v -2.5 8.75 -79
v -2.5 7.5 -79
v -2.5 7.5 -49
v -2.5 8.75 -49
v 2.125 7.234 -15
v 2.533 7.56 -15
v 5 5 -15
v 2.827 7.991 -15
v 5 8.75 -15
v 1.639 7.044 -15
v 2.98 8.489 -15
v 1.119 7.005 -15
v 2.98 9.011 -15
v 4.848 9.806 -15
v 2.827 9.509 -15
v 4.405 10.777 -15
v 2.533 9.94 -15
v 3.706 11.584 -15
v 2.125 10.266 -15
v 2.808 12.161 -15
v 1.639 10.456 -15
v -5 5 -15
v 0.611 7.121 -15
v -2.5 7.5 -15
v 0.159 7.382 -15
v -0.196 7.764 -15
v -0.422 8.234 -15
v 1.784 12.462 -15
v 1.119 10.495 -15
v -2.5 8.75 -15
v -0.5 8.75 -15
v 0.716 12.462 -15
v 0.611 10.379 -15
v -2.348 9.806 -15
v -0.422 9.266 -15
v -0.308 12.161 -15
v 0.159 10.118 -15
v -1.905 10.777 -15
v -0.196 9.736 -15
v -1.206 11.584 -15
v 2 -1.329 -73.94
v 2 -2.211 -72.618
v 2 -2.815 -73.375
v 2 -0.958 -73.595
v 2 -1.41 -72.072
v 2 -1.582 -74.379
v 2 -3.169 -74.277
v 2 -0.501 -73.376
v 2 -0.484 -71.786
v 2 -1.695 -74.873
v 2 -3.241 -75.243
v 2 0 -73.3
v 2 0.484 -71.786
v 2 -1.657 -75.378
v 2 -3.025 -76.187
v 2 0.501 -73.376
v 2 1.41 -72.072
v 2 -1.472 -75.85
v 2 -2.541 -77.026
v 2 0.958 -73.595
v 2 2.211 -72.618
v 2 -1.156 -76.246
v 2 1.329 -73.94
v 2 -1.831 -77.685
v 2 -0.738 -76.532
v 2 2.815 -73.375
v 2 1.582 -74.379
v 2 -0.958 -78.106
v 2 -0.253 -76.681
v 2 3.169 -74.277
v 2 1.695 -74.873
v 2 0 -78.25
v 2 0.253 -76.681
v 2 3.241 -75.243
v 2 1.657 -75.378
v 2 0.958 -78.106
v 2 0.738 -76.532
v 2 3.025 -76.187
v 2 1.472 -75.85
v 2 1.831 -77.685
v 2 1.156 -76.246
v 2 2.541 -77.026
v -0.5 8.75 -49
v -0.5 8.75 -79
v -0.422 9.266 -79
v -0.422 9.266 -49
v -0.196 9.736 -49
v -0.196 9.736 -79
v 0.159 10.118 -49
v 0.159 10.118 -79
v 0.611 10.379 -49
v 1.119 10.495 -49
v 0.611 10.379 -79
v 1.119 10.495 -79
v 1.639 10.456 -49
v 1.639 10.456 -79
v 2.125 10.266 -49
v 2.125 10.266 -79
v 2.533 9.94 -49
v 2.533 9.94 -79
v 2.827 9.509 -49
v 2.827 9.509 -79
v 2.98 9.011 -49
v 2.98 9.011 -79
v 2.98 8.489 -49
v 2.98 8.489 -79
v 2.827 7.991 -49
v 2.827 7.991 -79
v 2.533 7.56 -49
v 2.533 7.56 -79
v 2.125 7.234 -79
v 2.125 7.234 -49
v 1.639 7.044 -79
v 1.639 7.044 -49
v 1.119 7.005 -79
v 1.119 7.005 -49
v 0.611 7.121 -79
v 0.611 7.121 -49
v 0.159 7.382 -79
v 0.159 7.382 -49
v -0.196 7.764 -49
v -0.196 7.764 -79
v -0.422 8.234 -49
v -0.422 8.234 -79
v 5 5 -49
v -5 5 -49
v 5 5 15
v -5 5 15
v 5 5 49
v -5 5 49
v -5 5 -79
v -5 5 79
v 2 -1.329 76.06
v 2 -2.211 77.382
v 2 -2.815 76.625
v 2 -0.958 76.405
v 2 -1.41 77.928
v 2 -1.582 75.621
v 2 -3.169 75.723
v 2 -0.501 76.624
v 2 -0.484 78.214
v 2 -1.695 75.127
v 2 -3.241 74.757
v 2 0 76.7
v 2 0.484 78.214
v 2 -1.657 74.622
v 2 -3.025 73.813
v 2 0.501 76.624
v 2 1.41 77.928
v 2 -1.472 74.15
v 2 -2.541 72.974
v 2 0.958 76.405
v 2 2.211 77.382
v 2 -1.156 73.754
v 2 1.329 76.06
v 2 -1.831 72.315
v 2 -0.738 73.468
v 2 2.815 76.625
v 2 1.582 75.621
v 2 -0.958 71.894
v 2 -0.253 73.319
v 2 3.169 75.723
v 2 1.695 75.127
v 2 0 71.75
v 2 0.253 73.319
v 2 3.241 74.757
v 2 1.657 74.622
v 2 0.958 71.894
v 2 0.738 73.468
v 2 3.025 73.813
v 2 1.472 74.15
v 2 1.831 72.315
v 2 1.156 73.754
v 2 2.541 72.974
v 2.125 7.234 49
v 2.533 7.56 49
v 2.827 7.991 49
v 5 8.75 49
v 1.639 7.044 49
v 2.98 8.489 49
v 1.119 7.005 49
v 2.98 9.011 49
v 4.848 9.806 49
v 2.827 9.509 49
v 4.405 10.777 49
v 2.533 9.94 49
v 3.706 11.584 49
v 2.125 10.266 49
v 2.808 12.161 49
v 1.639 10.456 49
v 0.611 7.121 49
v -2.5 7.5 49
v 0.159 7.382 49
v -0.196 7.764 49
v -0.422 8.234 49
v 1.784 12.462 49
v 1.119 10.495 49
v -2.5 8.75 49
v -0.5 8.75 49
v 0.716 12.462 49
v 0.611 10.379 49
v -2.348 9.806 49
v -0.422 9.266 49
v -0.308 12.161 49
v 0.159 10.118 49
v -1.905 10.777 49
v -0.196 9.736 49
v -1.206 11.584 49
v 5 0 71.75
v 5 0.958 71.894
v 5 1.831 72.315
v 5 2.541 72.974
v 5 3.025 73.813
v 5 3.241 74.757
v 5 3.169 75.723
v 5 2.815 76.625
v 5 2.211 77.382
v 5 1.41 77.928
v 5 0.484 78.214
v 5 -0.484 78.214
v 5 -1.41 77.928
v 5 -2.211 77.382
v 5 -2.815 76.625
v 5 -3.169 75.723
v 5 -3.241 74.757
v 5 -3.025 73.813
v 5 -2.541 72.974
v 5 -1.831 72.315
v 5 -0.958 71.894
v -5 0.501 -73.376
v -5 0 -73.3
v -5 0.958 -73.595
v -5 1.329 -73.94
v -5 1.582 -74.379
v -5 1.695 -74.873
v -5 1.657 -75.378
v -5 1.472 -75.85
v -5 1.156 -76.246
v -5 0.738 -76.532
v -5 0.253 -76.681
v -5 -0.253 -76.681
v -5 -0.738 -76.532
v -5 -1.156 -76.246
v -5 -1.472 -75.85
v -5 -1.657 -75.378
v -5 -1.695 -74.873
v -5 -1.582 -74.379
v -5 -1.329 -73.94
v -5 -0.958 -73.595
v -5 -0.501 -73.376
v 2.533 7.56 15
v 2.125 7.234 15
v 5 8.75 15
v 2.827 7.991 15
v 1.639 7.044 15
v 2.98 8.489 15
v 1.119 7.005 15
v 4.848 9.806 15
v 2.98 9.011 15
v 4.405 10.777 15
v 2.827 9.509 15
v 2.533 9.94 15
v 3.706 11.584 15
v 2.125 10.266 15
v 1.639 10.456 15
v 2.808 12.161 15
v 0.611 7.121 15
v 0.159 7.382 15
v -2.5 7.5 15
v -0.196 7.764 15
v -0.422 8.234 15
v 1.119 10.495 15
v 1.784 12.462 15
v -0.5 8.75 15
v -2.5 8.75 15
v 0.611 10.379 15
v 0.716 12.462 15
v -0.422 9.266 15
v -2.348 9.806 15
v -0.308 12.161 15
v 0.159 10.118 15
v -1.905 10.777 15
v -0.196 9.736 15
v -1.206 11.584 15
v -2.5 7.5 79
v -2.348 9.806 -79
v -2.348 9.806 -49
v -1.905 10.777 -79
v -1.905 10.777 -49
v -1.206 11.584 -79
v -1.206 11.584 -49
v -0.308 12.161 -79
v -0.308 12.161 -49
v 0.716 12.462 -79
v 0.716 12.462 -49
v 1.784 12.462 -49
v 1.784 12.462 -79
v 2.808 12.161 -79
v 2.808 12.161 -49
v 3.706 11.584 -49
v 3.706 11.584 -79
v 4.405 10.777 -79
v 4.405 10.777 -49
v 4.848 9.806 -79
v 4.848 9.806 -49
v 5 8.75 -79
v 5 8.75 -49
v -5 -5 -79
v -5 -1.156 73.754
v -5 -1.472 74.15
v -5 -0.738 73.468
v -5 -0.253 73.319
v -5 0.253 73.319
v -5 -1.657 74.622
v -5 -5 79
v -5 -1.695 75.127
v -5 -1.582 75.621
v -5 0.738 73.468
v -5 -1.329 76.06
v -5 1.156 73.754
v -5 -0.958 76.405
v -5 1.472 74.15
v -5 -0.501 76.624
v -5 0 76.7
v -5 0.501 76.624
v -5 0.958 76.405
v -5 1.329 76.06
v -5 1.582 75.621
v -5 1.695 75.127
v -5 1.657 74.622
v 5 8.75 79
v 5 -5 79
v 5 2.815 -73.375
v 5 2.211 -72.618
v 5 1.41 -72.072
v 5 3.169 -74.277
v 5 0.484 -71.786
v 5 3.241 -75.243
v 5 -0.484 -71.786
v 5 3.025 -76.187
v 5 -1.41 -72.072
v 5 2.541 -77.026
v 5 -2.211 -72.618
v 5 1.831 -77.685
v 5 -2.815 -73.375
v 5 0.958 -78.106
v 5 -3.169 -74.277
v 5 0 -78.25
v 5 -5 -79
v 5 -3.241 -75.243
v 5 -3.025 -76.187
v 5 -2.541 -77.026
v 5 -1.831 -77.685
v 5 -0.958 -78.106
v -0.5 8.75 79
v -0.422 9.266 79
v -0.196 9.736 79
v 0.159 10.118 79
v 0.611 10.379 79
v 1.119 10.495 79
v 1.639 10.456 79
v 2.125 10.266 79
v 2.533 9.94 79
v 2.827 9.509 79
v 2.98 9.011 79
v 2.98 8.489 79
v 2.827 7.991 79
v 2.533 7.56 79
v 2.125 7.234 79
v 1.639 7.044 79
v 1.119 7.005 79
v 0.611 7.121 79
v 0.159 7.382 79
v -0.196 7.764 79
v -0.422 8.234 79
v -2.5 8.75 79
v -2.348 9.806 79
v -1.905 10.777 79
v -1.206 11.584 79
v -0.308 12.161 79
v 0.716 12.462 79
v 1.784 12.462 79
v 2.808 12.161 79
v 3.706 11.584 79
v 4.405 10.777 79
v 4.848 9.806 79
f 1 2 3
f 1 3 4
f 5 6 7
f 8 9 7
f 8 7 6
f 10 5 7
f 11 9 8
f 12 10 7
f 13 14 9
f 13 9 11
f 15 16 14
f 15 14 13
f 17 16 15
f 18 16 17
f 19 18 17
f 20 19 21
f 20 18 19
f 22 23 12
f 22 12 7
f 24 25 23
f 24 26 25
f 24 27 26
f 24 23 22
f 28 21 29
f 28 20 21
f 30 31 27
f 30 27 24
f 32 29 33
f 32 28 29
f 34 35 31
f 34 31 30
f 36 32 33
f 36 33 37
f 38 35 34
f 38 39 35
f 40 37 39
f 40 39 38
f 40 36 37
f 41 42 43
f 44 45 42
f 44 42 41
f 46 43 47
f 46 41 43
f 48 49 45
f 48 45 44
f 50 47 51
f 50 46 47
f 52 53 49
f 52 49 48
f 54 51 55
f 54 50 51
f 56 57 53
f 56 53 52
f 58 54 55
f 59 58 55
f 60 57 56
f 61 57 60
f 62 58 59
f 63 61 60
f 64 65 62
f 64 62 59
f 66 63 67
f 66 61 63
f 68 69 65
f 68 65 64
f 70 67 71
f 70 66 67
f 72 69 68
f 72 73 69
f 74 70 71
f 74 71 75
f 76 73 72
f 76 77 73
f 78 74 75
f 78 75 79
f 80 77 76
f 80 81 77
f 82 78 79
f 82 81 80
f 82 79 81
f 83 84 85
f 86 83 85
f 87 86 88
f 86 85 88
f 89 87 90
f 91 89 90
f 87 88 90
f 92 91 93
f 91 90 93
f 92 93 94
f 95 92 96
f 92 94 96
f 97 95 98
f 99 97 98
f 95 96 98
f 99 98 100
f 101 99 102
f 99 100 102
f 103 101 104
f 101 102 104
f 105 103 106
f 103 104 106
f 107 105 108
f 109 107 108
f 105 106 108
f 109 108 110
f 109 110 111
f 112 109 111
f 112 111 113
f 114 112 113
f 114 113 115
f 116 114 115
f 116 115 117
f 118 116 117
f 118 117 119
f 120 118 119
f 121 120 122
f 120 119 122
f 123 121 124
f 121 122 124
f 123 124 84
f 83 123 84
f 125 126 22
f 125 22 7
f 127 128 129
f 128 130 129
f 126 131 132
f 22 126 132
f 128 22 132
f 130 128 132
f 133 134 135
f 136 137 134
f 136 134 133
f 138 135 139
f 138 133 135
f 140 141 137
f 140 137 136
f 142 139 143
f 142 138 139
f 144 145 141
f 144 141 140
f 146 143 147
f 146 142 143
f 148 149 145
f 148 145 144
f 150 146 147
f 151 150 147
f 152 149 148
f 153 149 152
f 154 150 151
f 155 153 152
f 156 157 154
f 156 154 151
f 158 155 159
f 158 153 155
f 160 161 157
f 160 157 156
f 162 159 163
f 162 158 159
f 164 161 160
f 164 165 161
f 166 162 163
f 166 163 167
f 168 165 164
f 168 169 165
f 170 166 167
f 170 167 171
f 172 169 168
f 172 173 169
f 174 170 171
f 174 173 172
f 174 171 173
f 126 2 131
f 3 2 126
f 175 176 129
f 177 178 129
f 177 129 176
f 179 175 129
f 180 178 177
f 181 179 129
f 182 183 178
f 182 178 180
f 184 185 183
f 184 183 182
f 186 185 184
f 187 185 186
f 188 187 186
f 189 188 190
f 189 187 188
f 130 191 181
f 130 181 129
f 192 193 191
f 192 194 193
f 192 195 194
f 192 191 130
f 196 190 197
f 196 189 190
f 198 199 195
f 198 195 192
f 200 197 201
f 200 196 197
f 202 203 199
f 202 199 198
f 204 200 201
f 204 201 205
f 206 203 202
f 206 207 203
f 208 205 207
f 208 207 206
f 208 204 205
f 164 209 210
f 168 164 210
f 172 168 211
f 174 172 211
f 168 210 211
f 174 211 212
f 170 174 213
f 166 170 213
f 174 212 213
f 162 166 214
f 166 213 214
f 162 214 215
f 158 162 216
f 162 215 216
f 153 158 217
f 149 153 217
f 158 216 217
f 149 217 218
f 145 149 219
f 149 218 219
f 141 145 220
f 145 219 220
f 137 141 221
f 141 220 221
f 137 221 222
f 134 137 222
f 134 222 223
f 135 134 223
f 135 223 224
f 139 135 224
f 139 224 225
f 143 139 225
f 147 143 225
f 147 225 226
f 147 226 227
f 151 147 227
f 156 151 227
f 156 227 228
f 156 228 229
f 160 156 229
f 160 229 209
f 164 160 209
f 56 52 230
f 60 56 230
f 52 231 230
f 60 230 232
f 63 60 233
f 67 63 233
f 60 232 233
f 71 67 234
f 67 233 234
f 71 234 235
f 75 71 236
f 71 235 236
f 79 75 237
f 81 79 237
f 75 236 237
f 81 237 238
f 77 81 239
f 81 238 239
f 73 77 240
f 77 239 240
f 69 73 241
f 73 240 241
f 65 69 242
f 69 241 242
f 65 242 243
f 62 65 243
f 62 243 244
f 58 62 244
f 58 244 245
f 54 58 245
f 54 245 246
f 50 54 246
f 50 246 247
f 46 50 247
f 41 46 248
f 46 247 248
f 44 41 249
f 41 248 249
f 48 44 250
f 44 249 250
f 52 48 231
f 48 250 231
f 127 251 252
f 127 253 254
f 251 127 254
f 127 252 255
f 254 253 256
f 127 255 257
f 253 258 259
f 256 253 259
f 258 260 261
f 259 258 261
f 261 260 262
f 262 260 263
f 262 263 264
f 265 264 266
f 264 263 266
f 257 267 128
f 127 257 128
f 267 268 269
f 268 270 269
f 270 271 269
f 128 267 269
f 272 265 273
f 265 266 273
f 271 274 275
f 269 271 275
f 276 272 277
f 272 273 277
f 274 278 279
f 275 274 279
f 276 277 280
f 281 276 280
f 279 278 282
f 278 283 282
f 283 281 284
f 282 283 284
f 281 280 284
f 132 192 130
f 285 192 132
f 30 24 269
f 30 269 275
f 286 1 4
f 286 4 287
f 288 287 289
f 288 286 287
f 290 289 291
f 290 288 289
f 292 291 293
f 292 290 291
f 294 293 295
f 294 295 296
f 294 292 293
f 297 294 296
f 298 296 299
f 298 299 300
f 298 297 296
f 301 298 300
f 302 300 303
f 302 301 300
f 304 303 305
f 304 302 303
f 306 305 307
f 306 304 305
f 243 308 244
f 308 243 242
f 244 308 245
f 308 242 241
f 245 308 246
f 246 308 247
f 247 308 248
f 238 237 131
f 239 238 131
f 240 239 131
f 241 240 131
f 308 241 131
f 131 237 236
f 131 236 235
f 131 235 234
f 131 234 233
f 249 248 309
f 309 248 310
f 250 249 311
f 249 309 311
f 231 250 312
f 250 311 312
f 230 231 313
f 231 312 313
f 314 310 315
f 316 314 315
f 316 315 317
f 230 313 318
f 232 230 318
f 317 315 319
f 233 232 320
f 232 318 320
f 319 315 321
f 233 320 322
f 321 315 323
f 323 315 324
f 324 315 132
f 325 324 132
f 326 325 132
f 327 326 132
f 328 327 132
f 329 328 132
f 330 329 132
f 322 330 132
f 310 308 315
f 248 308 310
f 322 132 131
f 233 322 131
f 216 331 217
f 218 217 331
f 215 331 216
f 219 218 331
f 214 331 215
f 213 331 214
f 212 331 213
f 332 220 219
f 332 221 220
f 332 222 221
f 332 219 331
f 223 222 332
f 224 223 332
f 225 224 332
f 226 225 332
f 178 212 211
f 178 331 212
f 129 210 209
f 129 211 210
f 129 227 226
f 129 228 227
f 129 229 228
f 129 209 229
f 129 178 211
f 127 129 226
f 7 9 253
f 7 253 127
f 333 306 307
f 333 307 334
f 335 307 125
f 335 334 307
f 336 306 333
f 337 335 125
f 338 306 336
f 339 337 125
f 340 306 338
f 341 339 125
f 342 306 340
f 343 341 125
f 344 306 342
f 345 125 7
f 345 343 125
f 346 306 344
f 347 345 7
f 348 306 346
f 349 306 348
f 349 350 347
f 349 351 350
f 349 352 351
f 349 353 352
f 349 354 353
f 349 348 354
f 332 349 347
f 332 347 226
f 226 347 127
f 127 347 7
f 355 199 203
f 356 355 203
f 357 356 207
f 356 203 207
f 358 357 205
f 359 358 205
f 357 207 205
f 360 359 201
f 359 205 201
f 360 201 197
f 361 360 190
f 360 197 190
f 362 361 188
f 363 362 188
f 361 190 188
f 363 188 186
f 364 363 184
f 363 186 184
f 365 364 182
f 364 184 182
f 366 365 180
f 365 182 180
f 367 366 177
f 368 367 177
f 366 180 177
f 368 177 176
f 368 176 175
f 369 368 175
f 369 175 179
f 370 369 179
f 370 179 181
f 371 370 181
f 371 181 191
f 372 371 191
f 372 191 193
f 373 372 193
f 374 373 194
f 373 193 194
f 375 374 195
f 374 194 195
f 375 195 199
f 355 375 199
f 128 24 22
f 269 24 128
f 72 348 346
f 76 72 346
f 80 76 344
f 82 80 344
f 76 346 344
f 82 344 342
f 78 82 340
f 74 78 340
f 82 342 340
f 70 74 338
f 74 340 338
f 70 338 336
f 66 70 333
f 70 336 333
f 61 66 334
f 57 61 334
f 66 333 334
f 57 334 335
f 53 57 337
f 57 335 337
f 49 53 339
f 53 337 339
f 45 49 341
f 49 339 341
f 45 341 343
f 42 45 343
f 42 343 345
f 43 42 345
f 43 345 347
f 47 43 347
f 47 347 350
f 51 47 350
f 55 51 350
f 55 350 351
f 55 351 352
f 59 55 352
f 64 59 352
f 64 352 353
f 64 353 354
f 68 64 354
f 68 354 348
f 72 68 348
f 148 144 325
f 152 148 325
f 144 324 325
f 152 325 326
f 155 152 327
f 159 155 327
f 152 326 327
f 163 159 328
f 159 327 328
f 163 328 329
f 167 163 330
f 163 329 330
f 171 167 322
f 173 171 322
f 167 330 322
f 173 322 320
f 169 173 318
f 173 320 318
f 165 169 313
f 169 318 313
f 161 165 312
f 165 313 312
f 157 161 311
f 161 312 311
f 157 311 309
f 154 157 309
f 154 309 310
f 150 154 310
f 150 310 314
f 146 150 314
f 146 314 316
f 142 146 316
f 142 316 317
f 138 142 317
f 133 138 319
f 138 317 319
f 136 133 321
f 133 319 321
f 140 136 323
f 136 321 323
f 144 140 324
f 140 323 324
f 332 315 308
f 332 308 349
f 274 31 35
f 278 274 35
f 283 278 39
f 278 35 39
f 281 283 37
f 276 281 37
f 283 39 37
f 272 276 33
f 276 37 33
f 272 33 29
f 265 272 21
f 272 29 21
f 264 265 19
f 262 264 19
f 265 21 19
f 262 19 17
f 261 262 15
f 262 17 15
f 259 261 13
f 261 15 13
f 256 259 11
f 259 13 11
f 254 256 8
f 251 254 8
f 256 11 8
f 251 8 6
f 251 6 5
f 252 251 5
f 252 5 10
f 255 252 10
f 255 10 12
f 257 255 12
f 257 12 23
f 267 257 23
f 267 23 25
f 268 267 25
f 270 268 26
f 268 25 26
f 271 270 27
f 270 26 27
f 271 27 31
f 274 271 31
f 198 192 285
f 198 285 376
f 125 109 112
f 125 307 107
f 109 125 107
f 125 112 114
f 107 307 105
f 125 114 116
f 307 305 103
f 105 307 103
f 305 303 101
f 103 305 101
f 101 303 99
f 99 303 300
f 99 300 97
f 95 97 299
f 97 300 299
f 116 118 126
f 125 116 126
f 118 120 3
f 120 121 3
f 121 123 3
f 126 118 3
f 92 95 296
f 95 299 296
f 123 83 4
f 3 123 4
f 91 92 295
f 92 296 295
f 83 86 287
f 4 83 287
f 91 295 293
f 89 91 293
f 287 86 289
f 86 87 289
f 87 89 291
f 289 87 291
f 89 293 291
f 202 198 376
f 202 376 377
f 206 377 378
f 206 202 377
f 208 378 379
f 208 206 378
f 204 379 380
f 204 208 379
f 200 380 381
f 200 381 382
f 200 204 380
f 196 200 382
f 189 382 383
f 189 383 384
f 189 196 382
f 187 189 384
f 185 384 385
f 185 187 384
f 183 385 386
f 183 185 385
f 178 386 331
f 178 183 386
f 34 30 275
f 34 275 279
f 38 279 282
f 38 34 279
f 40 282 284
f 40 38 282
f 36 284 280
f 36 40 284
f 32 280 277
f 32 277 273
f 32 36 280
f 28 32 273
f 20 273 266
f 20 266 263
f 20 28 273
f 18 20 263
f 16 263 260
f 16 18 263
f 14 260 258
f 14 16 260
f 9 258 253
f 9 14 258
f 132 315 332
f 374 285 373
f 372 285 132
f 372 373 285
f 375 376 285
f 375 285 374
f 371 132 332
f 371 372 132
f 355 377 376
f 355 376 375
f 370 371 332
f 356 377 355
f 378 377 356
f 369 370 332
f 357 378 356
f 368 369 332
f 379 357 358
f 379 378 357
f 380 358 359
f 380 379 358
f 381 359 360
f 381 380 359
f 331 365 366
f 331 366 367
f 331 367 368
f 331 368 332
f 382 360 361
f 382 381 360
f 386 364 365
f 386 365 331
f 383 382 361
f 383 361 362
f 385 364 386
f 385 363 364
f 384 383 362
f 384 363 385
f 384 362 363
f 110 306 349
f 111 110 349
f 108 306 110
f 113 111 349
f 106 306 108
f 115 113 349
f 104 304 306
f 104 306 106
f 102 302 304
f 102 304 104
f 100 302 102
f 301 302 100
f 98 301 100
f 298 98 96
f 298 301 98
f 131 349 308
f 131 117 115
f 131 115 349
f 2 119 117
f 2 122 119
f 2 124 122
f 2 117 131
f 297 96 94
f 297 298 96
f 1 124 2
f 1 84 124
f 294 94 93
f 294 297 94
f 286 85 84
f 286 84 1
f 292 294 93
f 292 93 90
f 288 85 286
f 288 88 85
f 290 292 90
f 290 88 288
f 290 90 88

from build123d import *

# Parameters (mm, degrees)
ESQUISSE1_W                                     = 10
ESQUISSE1_H                                     = 10
BOSS_EXTRU_1_DEPTH                              = 79
ESQUISSE2_R                                     = 3.75
ESQUISSE2_R_2                                   = 1.75
BOSS_EXTRU_2_DEPTH                              = 30
R_P_TITION_LIN_AIRE1_COUNT                      = 3
R_P_TITION_LIN_AIRE1_PITCH                      = 64
CHAMBRAGE_POUR_VIS_T_TE_CYLINDRIQUE_D           = 3.4
CHAMBRAGE_POUR_VIS_T_TE_CYLINDRIQUE_CBORE_D     = 6.5
CHAMBRAGE_POUR_VIS_T_TE_CYLINDRIQUE_CBORE_DEPTH = 3
CHANFREIN1_SIZE                                 = 2.5


with BuildPart() as part:
    # Esquisse1 → Boss.-Extru.1 (new, symmetric)
    with BuildSketch(Plane.XY):
        Rectangle(ESQUISSE1_W, ESQUISSE1_H)
    extrude(amount=BOSS_EXTRU_1_DEPTH, both=True)

    # Esquisse2 → Boss.-Extru.2 (add)
    # profile 1 of 3: a face of its own
    with BuildSketch(Plane(origin=(0, 0, -79), x_dir=(-1, 0, 0), z_dir=(0, 0, -1))):
        with BuildLine():
            Line((-5, 5), (-1.25, 5))
            ThreePointArc((-1.25, 5), (-3.901650429, 6.098349571), (-5, 8.75))
            Line((-5, 8.75), (-5, 5))
        make_face()
    # profile 2 of 3: a face of its own
    with BuildSketch(Plane(origin=(0, 0, -79), x_dir=(-1, 0, 0), z_dir=(0, 0, -1))):
        with Locations((-1.25, 8.75)):
            Circle(ESQUISSE2_R)
        with Locations((-1.25, 8.75)):
            Circle(ESQUISSE2_R_2, mode=Mode.SUBTRACT)
    # profile 3 of 3: a face of its own
    with BuildSketch(Plane(origin=(0, 0, -79), x_dir=(-1, 0, 0), z_dir=(0, 0, -1))):
        with BuildLine():
            ThreePointArc((2.5, 8.75), (1.401650429, 6.098349571), (-1.25, 5))
            Line((-1.25, 5), (2.5, 5))
            Line((2.5, 5), (2.5, 8.75))
        make_face()
    boss_extru_2 = extrude(amount=-BOSS_EXTRU_2_DEPTH)

    # Répétition linéaire1: Boss.-Extru.2 ×3
    with Locations(*[(0, 0, i * R_P_TITION_LIN_AIRE1_PITCH) for i in range(1, R_P_TITION_LIN_AIRE1_COUNT)]):
        add(boss_extru_2)

    # Chambrage pour vis à tête cylindrique à 6 pans creux (ou vis CHC) M31 (through all)
    with Locations(Plane(origin=(5, 0, 0), x_dir=(0, 0, -1), z_dir=(1, 0, 0))):
        with Locations((-75, 0), (75, 0)):
            CounterBoreHole(CHAMBRAGE_POUR_VIS_T_TE_CYLINDRIQUE_D / 2, CHAMBRAGE_POUR_VIS_T_TE_CYLINDRIQUE_CBORE_D / 2, CHAMBRAGE_POUR_VIS_T_TE_CYLINDRIQUE_CBORE_DEPTH)

    # Chanfrein1
    chanfrein1_edges = [part.edges().sort_by_distance(p)[0] for p in [
        (-2.5, 5, 64),
        (-2.5, 5, 0),
        (-2.5, 5, -64),
    ]]
    chamfer(chanfrein1_edges, length=CHANFREIN1_SIZE - 0.0001)  # a hair under: the kernel refuses the full size


solid = part.part
